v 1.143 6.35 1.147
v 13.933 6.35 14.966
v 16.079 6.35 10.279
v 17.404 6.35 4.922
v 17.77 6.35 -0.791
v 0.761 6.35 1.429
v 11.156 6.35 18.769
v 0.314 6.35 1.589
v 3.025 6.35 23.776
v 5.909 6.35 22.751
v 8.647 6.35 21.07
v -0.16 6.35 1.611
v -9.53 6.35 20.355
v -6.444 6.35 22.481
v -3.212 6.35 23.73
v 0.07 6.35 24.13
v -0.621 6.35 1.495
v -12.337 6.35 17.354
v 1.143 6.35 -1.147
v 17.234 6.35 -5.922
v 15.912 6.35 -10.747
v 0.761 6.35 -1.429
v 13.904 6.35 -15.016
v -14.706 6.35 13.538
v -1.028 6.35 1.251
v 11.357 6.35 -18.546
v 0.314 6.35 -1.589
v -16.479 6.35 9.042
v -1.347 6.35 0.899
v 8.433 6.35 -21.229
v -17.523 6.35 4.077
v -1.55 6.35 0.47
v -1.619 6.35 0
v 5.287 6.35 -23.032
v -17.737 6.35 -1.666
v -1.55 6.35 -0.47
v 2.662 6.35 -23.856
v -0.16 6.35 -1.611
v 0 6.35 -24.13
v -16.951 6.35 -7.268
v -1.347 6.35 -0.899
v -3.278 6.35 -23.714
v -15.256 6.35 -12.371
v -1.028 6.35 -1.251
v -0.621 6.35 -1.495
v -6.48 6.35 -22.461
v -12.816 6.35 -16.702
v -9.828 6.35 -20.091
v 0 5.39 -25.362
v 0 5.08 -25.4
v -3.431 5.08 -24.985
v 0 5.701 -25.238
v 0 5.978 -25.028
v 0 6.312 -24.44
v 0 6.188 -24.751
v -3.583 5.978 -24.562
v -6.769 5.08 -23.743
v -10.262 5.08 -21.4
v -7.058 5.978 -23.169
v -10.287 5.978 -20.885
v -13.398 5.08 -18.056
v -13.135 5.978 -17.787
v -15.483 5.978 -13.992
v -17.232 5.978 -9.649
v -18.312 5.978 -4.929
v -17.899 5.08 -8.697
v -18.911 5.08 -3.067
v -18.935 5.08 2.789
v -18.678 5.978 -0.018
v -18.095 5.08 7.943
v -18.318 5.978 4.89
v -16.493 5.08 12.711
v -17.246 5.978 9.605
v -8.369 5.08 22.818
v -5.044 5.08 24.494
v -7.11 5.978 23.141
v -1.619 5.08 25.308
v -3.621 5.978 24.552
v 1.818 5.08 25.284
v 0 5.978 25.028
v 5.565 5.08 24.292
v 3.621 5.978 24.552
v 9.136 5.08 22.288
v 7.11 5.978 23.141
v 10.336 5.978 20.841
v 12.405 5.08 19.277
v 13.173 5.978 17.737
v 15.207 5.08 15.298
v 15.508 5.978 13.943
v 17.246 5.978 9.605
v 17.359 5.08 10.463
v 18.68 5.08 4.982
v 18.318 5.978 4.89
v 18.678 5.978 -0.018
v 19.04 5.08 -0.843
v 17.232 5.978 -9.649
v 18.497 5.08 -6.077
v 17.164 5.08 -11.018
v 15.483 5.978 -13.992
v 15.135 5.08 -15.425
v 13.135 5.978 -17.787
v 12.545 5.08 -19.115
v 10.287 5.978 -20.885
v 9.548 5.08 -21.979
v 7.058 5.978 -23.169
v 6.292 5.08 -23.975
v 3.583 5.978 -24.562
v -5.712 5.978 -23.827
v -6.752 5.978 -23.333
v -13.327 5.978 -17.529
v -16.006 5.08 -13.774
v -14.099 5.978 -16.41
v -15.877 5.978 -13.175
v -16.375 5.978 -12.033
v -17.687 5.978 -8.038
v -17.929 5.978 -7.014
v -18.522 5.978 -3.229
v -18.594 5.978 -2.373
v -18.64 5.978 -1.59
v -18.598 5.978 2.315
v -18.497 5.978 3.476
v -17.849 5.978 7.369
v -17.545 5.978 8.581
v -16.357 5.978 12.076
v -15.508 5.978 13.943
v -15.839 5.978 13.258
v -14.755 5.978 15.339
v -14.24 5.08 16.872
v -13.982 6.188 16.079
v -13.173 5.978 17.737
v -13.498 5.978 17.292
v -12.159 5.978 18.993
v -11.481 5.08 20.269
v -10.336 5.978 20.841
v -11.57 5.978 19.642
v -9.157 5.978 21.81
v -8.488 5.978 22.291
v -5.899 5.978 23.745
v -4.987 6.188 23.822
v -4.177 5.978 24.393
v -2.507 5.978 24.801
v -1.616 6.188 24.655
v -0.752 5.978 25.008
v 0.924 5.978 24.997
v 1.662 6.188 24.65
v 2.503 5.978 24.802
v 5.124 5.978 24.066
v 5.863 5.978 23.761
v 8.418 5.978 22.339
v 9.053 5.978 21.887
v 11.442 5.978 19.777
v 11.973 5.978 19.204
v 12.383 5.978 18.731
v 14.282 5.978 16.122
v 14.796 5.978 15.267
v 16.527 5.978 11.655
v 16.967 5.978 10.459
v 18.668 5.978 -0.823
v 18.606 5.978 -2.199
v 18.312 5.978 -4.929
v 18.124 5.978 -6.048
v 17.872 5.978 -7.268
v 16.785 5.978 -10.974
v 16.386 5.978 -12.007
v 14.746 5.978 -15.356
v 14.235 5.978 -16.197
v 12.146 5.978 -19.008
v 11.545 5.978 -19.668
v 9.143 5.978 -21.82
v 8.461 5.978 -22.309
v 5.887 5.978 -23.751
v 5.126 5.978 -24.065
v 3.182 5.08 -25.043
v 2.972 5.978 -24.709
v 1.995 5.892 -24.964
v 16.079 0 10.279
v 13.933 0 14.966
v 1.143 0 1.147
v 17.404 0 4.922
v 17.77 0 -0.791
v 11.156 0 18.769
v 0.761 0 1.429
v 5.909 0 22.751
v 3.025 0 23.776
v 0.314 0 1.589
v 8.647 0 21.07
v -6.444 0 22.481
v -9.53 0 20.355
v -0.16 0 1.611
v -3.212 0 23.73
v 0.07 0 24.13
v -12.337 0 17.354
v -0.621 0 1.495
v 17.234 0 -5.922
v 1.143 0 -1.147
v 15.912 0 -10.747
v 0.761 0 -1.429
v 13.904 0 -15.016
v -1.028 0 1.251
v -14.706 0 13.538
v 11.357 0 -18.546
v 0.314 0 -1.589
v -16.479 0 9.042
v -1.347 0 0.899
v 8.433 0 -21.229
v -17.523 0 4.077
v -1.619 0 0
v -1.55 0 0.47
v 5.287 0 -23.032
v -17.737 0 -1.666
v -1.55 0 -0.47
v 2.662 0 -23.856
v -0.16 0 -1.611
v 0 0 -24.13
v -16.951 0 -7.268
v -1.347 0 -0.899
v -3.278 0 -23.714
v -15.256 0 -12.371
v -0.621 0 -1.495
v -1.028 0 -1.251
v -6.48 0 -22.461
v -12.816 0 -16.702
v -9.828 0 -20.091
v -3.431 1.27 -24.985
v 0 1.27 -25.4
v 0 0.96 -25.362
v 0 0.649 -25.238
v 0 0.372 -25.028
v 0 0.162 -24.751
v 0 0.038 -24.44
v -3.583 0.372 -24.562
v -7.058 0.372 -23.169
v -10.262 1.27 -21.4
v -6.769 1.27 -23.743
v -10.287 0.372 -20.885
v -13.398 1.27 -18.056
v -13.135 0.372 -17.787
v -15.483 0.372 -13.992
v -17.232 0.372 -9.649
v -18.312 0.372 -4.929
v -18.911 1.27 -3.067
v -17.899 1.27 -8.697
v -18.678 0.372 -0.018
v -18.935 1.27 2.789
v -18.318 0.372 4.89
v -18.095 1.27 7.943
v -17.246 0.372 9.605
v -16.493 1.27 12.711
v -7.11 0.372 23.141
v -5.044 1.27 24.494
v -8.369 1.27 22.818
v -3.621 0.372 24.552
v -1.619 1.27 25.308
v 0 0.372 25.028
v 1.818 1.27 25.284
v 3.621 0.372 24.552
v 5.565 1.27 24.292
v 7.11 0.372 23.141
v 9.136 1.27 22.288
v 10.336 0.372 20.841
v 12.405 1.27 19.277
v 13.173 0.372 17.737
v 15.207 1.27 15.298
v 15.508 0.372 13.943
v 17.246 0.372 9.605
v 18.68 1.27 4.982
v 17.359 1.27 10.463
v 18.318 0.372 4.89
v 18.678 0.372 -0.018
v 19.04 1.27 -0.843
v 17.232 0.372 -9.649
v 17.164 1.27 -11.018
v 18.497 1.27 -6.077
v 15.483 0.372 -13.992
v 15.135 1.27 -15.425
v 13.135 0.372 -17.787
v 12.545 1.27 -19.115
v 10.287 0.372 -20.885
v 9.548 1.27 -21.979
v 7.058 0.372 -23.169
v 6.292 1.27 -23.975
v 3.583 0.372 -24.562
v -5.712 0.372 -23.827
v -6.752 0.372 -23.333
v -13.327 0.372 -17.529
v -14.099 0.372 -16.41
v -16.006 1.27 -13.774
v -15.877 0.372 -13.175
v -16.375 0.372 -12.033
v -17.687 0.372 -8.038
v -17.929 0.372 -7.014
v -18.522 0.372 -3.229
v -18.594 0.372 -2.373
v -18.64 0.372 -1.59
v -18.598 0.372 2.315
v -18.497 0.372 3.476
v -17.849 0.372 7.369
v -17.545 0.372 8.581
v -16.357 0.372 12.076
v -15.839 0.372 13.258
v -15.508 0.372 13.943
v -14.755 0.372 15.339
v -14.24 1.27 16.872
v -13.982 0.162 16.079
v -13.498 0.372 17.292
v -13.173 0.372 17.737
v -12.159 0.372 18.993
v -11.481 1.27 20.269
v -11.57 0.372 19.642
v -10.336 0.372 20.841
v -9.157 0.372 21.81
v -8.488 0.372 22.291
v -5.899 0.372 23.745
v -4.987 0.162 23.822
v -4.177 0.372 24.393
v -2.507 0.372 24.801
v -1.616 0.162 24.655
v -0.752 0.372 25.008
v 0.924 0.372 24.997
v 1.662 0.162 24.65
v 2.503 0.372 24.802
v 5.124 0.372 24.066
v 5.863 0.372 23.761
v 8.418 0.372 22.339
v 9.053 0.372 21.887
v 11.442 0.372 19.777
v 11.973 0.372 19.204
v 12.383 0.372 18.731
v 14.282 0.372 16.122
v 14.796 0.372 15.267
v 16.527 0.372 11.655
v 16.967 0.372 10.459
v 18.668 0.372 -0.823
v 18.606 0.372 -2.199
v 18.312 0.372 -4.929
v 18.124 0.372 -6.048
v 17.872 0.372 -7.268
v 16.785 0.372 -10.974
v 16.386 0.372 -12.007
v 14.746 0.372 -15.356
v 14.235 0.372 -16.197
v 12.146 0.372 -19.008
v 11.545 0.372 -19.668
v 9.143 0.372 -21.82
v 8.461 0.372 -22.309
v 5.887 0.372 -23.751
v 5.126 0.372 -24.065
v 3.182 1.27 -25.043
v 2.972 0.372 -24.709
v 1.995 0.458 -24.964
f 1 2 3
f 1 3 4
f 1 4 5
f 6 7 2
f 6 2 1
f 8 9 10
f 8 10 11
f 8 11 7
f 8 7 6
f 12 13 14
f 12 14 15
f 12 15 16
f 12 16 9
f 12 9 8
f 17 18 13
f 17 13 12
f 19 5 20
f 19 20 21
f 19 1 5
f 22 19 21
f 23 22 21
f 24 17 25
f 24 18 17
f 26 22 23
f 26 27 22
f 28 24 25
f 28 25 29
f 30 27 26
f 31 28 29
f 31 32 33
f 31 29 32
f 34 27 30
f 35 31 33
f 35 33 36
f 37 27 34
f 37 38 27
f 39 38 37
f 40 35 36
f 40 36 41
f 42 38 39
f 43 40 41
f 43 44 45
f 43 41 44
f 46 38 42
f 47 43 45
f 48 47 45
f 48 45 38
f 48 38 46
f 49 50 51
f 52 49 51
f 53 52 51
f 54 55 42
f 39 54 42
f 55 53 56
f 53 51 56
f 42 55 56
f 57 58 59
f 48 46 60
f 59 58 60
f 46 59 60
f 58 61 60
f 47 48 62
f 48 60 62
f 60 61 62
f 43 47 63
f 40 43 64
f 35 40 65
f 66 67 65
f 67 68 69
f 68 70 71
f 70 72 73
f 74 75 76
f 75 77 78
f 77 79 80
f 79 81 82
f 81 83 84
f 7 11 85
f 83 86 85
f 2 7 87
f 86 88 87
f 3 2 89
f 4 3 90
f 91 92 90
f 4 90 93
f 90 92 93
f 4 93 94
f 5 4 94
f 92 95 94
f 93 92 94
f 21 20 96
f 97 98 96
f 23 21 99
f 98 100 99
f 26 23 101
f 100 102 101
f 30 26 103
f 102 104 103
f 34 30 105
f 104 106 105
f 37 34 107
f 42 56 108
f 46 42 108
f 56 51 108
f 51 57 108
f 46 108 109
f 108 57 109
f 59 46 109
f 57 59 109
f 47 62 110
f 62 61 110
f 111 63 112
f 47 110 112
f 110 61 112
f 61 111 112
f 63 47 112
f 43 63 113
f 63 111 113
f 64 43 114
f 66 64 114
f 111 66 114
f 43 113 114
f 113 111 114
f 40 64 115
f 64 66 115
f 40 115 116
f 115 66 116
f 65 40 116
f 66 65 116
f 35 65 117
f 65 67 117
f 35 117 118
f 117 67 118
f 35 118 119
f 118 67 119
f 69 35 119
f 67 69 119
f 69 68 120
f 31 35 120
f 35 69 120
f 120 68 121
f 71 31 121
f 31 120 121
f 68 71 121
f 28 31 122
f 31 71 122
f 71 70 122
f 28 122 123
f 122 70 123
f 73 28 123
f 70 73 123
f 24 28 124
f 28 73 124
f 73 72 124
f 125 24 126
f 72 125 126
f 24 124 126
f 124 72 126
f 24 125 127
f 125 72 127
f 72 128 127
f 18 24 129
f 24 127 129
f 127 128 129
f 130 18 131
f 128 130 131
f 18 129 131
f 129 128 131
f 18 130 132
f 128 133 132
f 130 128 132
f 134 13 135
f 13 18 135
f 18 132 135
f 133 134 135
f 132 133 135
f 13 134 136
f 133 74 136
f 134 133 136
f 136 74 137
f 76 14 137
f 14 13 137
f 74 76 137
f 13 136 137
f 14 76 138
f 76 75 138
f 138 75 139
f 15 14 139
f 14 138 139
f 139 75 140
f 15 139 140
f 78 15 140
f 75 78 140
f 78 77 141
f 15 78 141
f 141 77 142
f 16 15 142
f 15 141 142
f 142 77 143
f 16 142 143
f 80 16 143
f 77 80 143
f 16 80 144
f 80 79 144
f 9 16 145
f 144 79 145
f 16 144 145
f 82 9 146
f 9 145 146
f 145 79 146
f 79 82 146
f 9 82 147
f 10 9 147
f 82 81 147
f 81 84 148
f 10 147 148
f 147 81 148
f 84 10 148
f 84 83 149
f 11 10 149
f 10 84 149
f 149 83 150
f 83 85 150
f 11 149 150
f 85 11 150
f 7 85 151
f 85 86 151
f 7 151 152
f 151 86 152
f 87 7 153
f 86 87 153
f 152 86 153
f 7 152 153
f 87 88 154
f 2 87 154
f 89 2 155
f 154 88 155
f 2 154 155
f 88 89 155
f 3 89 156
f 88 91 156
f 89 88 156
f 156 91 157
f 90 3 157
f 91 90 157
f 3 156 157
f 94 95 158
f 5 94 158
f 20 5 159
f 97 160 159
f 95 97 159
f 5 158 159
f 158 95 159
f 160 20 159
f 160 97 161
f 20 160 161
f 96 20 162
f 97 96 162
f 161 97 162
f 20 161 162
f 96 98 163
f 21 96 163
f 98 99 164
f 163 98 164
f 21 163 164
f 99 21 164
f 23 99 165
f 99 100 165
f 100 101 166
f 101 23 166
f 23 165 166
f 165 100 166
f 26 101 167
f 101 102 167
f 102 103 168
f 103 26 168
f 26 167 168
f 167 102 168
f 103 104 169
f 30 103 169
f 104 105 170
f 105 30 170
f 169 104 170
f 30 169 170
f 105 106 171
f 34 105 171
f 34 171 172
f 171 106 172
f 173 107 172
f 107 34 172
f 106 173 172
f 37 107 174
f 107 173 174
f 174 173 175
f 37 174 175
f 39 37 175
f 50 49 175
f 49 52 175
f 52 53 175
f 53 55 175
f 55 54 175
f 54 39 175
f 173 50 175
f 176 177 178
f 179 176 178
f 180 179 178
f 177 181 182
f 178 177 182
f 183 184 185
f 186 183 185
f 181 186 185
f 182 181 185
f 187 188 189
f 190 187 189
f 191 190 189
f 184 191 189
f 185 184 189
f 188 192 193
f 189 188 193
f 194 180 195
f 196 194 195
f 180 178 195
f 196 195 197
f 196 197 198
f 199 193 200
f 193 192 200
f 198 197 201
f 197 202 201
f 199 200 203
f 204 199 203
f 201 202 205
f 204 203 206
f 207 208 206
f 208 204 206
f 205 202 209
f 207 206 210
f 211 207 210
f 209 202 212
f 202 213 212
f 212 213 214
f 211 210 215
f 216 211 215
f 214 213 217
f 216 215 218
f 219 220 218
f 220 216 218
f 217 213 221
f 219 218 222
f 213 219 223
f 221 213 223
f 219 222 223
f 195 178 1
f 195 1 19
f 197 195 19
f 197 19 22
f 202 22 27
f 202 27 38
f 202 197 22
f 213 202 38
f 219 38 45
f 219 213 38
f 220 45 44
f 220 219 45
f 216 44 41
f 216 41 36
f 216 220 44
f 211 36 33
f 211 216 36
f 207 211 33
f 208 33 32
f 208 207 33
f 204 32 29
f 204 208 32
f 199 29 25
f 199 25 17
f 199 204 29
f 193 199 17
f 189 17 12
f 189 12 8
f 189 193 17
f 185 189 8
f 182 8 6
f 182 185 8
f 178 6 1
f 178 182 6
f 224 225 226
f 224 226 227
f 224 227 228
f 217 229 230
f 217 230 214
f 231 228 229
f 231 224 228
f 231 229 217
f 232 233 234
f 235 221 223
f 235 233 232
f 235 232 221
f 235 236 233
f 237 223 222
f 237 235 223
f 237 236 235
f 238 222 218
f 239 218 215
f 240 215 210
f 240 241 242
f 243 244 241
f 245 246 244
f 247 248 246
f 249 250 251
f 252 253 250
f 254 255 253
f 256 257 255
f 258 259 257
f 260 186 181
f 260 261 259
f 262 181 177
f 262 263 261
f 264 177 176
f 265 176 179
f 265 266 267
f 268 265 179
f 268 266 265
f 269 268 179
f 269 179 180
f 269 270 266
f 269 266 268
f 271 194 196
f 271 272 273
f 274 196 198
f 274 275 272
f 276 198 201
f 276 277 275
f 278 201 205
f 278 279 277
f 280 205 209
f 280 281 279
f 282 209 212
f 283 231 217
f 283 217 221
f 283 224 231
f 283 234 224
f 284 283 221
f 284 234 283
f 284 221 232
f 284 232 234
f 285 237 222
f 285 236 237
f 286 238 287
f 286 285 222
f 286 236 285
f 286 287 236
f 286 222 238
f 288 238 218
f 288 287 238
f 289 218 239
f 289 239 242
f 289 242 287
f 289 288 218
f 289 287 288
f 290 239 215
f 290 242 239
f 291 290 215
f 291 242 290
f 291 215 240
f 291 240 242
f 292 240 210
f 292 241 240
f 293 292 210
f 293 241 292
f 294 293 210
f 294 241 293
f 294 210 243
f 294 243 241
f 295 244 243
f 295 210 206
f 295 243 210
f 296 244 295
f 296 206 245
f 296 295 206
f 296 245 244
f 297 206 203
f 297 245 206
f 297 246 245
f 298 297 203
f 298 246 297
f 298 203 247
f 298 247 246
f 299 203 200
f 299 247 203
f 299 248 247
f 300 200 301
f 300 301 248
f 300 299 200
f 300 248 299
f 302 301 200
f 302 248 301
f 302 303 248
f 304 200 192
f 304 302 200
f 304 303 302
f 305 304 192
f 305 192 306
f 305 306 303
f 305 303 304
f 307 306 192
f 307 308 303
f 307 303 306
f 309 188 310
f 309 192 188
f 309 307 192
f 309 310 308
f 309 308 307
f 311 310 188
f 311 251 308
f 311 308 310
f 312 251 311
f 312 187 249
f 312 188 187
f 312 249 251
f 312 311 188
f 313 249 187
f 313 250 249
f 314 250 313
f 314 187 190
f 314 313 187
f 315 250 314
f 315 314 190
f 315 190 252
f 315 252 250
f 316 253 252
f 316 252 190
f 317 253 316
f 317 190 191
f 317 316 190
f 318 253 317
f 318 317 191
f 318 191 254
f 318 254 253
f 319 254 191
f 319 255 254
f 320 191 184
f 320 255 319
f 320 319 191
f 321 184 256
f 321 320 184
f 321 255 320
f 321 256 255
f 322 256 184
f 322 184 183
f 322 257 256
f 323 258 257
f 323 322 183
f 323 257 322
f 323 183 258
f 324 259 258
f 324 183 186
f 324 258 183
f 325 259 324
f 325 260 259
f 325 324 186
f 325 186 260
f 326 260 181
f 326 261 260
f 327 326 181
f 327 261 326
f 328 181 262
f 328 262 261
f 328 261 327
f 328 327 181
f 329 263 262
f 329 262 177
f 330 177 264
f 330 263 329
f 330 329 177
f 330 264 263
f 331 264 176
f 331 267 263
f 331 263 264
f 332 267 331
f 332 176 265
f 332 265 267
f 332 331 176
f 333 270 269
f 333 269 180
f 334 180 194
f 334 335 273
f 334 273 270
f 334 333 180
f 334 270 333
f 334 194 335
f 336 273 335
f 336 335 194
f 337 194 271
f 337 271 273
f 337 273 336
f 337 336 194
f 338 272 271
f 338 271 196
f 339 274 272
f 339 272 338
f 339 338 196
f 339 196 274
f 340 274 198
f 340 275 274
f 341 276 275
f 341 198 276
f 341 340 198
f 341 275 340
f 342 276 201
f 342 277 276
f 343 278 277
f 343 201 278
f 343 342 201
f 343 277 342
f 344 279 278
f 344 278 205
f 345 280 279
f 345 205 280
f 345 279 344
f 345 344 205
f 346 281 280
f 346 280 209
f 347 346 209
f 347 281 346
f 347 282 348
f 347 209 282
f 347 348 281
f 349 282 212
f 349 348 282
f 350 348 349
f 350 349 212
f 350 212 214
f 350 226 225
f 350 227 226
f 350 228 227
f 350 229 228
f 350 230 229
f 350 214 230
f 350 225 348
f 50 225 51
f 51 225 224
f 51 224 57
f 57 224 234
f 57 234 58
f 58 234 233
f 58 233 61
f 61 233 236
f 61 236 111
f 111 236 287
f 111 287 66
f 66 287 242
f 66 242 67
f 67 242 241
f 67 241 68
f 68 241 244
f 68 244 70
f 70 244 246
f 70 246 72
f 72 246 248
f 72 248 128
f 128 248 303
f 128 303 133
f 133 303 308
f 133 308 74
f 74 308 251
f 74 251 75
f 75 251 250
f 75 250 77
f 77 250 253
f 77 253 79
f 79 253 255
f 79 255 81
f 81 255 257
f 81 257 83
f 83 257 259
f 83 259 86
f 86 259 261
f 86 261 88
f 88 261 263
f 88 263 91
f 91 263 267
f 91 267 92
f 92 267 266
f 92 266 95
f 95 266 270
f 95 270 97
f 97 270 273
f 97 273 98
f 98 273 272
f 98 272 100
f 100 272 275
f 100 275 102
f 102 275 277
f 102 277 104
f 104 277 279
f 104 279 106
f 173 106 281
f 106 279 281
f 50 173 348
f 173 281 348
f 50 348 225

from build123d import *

# Parameters (mm, degrees)
SKETCH2_RX  = 25.4
SKETCH2_RY  = 19.05
CRANK_DEPTH = 6.35
FILLET_2_R  = 1.27


with BuildPart() as part:
    # Sketch2 → Crank (new body)
    with BuildSketch(Plane(origin=(0, 0, 0), x_dir=(1, 0, 0), z_dir=(0, 1, 0))):
        with Locations(Location((0, 0), (0, 0, 90))):
            Ellipse(SKETCH2_RX, SKETCH2_RY)
        with BuildLine():
            Line((1.143, -1.146961884), (1.143, 1.146961884))
            ThreePointArc((1.143, 1.146961884), (-1.61925, 0), (1.143, -1.146961884))
        make_face(mode=Mode.SUBTRACT)
    extrude(amount=CRANK_DEPTH)

    # Fillet 2
    fillet_2_edges = [part.edges().sort_by_distance(p)[0] for p in [
        (0.006668232, 0, 25.399998444),
        (0.006668232, 6.35, 25.399998444),
    ]]
    fillet(fillet_2_edges, radius=FILLET_2_R)


solid = part.part
